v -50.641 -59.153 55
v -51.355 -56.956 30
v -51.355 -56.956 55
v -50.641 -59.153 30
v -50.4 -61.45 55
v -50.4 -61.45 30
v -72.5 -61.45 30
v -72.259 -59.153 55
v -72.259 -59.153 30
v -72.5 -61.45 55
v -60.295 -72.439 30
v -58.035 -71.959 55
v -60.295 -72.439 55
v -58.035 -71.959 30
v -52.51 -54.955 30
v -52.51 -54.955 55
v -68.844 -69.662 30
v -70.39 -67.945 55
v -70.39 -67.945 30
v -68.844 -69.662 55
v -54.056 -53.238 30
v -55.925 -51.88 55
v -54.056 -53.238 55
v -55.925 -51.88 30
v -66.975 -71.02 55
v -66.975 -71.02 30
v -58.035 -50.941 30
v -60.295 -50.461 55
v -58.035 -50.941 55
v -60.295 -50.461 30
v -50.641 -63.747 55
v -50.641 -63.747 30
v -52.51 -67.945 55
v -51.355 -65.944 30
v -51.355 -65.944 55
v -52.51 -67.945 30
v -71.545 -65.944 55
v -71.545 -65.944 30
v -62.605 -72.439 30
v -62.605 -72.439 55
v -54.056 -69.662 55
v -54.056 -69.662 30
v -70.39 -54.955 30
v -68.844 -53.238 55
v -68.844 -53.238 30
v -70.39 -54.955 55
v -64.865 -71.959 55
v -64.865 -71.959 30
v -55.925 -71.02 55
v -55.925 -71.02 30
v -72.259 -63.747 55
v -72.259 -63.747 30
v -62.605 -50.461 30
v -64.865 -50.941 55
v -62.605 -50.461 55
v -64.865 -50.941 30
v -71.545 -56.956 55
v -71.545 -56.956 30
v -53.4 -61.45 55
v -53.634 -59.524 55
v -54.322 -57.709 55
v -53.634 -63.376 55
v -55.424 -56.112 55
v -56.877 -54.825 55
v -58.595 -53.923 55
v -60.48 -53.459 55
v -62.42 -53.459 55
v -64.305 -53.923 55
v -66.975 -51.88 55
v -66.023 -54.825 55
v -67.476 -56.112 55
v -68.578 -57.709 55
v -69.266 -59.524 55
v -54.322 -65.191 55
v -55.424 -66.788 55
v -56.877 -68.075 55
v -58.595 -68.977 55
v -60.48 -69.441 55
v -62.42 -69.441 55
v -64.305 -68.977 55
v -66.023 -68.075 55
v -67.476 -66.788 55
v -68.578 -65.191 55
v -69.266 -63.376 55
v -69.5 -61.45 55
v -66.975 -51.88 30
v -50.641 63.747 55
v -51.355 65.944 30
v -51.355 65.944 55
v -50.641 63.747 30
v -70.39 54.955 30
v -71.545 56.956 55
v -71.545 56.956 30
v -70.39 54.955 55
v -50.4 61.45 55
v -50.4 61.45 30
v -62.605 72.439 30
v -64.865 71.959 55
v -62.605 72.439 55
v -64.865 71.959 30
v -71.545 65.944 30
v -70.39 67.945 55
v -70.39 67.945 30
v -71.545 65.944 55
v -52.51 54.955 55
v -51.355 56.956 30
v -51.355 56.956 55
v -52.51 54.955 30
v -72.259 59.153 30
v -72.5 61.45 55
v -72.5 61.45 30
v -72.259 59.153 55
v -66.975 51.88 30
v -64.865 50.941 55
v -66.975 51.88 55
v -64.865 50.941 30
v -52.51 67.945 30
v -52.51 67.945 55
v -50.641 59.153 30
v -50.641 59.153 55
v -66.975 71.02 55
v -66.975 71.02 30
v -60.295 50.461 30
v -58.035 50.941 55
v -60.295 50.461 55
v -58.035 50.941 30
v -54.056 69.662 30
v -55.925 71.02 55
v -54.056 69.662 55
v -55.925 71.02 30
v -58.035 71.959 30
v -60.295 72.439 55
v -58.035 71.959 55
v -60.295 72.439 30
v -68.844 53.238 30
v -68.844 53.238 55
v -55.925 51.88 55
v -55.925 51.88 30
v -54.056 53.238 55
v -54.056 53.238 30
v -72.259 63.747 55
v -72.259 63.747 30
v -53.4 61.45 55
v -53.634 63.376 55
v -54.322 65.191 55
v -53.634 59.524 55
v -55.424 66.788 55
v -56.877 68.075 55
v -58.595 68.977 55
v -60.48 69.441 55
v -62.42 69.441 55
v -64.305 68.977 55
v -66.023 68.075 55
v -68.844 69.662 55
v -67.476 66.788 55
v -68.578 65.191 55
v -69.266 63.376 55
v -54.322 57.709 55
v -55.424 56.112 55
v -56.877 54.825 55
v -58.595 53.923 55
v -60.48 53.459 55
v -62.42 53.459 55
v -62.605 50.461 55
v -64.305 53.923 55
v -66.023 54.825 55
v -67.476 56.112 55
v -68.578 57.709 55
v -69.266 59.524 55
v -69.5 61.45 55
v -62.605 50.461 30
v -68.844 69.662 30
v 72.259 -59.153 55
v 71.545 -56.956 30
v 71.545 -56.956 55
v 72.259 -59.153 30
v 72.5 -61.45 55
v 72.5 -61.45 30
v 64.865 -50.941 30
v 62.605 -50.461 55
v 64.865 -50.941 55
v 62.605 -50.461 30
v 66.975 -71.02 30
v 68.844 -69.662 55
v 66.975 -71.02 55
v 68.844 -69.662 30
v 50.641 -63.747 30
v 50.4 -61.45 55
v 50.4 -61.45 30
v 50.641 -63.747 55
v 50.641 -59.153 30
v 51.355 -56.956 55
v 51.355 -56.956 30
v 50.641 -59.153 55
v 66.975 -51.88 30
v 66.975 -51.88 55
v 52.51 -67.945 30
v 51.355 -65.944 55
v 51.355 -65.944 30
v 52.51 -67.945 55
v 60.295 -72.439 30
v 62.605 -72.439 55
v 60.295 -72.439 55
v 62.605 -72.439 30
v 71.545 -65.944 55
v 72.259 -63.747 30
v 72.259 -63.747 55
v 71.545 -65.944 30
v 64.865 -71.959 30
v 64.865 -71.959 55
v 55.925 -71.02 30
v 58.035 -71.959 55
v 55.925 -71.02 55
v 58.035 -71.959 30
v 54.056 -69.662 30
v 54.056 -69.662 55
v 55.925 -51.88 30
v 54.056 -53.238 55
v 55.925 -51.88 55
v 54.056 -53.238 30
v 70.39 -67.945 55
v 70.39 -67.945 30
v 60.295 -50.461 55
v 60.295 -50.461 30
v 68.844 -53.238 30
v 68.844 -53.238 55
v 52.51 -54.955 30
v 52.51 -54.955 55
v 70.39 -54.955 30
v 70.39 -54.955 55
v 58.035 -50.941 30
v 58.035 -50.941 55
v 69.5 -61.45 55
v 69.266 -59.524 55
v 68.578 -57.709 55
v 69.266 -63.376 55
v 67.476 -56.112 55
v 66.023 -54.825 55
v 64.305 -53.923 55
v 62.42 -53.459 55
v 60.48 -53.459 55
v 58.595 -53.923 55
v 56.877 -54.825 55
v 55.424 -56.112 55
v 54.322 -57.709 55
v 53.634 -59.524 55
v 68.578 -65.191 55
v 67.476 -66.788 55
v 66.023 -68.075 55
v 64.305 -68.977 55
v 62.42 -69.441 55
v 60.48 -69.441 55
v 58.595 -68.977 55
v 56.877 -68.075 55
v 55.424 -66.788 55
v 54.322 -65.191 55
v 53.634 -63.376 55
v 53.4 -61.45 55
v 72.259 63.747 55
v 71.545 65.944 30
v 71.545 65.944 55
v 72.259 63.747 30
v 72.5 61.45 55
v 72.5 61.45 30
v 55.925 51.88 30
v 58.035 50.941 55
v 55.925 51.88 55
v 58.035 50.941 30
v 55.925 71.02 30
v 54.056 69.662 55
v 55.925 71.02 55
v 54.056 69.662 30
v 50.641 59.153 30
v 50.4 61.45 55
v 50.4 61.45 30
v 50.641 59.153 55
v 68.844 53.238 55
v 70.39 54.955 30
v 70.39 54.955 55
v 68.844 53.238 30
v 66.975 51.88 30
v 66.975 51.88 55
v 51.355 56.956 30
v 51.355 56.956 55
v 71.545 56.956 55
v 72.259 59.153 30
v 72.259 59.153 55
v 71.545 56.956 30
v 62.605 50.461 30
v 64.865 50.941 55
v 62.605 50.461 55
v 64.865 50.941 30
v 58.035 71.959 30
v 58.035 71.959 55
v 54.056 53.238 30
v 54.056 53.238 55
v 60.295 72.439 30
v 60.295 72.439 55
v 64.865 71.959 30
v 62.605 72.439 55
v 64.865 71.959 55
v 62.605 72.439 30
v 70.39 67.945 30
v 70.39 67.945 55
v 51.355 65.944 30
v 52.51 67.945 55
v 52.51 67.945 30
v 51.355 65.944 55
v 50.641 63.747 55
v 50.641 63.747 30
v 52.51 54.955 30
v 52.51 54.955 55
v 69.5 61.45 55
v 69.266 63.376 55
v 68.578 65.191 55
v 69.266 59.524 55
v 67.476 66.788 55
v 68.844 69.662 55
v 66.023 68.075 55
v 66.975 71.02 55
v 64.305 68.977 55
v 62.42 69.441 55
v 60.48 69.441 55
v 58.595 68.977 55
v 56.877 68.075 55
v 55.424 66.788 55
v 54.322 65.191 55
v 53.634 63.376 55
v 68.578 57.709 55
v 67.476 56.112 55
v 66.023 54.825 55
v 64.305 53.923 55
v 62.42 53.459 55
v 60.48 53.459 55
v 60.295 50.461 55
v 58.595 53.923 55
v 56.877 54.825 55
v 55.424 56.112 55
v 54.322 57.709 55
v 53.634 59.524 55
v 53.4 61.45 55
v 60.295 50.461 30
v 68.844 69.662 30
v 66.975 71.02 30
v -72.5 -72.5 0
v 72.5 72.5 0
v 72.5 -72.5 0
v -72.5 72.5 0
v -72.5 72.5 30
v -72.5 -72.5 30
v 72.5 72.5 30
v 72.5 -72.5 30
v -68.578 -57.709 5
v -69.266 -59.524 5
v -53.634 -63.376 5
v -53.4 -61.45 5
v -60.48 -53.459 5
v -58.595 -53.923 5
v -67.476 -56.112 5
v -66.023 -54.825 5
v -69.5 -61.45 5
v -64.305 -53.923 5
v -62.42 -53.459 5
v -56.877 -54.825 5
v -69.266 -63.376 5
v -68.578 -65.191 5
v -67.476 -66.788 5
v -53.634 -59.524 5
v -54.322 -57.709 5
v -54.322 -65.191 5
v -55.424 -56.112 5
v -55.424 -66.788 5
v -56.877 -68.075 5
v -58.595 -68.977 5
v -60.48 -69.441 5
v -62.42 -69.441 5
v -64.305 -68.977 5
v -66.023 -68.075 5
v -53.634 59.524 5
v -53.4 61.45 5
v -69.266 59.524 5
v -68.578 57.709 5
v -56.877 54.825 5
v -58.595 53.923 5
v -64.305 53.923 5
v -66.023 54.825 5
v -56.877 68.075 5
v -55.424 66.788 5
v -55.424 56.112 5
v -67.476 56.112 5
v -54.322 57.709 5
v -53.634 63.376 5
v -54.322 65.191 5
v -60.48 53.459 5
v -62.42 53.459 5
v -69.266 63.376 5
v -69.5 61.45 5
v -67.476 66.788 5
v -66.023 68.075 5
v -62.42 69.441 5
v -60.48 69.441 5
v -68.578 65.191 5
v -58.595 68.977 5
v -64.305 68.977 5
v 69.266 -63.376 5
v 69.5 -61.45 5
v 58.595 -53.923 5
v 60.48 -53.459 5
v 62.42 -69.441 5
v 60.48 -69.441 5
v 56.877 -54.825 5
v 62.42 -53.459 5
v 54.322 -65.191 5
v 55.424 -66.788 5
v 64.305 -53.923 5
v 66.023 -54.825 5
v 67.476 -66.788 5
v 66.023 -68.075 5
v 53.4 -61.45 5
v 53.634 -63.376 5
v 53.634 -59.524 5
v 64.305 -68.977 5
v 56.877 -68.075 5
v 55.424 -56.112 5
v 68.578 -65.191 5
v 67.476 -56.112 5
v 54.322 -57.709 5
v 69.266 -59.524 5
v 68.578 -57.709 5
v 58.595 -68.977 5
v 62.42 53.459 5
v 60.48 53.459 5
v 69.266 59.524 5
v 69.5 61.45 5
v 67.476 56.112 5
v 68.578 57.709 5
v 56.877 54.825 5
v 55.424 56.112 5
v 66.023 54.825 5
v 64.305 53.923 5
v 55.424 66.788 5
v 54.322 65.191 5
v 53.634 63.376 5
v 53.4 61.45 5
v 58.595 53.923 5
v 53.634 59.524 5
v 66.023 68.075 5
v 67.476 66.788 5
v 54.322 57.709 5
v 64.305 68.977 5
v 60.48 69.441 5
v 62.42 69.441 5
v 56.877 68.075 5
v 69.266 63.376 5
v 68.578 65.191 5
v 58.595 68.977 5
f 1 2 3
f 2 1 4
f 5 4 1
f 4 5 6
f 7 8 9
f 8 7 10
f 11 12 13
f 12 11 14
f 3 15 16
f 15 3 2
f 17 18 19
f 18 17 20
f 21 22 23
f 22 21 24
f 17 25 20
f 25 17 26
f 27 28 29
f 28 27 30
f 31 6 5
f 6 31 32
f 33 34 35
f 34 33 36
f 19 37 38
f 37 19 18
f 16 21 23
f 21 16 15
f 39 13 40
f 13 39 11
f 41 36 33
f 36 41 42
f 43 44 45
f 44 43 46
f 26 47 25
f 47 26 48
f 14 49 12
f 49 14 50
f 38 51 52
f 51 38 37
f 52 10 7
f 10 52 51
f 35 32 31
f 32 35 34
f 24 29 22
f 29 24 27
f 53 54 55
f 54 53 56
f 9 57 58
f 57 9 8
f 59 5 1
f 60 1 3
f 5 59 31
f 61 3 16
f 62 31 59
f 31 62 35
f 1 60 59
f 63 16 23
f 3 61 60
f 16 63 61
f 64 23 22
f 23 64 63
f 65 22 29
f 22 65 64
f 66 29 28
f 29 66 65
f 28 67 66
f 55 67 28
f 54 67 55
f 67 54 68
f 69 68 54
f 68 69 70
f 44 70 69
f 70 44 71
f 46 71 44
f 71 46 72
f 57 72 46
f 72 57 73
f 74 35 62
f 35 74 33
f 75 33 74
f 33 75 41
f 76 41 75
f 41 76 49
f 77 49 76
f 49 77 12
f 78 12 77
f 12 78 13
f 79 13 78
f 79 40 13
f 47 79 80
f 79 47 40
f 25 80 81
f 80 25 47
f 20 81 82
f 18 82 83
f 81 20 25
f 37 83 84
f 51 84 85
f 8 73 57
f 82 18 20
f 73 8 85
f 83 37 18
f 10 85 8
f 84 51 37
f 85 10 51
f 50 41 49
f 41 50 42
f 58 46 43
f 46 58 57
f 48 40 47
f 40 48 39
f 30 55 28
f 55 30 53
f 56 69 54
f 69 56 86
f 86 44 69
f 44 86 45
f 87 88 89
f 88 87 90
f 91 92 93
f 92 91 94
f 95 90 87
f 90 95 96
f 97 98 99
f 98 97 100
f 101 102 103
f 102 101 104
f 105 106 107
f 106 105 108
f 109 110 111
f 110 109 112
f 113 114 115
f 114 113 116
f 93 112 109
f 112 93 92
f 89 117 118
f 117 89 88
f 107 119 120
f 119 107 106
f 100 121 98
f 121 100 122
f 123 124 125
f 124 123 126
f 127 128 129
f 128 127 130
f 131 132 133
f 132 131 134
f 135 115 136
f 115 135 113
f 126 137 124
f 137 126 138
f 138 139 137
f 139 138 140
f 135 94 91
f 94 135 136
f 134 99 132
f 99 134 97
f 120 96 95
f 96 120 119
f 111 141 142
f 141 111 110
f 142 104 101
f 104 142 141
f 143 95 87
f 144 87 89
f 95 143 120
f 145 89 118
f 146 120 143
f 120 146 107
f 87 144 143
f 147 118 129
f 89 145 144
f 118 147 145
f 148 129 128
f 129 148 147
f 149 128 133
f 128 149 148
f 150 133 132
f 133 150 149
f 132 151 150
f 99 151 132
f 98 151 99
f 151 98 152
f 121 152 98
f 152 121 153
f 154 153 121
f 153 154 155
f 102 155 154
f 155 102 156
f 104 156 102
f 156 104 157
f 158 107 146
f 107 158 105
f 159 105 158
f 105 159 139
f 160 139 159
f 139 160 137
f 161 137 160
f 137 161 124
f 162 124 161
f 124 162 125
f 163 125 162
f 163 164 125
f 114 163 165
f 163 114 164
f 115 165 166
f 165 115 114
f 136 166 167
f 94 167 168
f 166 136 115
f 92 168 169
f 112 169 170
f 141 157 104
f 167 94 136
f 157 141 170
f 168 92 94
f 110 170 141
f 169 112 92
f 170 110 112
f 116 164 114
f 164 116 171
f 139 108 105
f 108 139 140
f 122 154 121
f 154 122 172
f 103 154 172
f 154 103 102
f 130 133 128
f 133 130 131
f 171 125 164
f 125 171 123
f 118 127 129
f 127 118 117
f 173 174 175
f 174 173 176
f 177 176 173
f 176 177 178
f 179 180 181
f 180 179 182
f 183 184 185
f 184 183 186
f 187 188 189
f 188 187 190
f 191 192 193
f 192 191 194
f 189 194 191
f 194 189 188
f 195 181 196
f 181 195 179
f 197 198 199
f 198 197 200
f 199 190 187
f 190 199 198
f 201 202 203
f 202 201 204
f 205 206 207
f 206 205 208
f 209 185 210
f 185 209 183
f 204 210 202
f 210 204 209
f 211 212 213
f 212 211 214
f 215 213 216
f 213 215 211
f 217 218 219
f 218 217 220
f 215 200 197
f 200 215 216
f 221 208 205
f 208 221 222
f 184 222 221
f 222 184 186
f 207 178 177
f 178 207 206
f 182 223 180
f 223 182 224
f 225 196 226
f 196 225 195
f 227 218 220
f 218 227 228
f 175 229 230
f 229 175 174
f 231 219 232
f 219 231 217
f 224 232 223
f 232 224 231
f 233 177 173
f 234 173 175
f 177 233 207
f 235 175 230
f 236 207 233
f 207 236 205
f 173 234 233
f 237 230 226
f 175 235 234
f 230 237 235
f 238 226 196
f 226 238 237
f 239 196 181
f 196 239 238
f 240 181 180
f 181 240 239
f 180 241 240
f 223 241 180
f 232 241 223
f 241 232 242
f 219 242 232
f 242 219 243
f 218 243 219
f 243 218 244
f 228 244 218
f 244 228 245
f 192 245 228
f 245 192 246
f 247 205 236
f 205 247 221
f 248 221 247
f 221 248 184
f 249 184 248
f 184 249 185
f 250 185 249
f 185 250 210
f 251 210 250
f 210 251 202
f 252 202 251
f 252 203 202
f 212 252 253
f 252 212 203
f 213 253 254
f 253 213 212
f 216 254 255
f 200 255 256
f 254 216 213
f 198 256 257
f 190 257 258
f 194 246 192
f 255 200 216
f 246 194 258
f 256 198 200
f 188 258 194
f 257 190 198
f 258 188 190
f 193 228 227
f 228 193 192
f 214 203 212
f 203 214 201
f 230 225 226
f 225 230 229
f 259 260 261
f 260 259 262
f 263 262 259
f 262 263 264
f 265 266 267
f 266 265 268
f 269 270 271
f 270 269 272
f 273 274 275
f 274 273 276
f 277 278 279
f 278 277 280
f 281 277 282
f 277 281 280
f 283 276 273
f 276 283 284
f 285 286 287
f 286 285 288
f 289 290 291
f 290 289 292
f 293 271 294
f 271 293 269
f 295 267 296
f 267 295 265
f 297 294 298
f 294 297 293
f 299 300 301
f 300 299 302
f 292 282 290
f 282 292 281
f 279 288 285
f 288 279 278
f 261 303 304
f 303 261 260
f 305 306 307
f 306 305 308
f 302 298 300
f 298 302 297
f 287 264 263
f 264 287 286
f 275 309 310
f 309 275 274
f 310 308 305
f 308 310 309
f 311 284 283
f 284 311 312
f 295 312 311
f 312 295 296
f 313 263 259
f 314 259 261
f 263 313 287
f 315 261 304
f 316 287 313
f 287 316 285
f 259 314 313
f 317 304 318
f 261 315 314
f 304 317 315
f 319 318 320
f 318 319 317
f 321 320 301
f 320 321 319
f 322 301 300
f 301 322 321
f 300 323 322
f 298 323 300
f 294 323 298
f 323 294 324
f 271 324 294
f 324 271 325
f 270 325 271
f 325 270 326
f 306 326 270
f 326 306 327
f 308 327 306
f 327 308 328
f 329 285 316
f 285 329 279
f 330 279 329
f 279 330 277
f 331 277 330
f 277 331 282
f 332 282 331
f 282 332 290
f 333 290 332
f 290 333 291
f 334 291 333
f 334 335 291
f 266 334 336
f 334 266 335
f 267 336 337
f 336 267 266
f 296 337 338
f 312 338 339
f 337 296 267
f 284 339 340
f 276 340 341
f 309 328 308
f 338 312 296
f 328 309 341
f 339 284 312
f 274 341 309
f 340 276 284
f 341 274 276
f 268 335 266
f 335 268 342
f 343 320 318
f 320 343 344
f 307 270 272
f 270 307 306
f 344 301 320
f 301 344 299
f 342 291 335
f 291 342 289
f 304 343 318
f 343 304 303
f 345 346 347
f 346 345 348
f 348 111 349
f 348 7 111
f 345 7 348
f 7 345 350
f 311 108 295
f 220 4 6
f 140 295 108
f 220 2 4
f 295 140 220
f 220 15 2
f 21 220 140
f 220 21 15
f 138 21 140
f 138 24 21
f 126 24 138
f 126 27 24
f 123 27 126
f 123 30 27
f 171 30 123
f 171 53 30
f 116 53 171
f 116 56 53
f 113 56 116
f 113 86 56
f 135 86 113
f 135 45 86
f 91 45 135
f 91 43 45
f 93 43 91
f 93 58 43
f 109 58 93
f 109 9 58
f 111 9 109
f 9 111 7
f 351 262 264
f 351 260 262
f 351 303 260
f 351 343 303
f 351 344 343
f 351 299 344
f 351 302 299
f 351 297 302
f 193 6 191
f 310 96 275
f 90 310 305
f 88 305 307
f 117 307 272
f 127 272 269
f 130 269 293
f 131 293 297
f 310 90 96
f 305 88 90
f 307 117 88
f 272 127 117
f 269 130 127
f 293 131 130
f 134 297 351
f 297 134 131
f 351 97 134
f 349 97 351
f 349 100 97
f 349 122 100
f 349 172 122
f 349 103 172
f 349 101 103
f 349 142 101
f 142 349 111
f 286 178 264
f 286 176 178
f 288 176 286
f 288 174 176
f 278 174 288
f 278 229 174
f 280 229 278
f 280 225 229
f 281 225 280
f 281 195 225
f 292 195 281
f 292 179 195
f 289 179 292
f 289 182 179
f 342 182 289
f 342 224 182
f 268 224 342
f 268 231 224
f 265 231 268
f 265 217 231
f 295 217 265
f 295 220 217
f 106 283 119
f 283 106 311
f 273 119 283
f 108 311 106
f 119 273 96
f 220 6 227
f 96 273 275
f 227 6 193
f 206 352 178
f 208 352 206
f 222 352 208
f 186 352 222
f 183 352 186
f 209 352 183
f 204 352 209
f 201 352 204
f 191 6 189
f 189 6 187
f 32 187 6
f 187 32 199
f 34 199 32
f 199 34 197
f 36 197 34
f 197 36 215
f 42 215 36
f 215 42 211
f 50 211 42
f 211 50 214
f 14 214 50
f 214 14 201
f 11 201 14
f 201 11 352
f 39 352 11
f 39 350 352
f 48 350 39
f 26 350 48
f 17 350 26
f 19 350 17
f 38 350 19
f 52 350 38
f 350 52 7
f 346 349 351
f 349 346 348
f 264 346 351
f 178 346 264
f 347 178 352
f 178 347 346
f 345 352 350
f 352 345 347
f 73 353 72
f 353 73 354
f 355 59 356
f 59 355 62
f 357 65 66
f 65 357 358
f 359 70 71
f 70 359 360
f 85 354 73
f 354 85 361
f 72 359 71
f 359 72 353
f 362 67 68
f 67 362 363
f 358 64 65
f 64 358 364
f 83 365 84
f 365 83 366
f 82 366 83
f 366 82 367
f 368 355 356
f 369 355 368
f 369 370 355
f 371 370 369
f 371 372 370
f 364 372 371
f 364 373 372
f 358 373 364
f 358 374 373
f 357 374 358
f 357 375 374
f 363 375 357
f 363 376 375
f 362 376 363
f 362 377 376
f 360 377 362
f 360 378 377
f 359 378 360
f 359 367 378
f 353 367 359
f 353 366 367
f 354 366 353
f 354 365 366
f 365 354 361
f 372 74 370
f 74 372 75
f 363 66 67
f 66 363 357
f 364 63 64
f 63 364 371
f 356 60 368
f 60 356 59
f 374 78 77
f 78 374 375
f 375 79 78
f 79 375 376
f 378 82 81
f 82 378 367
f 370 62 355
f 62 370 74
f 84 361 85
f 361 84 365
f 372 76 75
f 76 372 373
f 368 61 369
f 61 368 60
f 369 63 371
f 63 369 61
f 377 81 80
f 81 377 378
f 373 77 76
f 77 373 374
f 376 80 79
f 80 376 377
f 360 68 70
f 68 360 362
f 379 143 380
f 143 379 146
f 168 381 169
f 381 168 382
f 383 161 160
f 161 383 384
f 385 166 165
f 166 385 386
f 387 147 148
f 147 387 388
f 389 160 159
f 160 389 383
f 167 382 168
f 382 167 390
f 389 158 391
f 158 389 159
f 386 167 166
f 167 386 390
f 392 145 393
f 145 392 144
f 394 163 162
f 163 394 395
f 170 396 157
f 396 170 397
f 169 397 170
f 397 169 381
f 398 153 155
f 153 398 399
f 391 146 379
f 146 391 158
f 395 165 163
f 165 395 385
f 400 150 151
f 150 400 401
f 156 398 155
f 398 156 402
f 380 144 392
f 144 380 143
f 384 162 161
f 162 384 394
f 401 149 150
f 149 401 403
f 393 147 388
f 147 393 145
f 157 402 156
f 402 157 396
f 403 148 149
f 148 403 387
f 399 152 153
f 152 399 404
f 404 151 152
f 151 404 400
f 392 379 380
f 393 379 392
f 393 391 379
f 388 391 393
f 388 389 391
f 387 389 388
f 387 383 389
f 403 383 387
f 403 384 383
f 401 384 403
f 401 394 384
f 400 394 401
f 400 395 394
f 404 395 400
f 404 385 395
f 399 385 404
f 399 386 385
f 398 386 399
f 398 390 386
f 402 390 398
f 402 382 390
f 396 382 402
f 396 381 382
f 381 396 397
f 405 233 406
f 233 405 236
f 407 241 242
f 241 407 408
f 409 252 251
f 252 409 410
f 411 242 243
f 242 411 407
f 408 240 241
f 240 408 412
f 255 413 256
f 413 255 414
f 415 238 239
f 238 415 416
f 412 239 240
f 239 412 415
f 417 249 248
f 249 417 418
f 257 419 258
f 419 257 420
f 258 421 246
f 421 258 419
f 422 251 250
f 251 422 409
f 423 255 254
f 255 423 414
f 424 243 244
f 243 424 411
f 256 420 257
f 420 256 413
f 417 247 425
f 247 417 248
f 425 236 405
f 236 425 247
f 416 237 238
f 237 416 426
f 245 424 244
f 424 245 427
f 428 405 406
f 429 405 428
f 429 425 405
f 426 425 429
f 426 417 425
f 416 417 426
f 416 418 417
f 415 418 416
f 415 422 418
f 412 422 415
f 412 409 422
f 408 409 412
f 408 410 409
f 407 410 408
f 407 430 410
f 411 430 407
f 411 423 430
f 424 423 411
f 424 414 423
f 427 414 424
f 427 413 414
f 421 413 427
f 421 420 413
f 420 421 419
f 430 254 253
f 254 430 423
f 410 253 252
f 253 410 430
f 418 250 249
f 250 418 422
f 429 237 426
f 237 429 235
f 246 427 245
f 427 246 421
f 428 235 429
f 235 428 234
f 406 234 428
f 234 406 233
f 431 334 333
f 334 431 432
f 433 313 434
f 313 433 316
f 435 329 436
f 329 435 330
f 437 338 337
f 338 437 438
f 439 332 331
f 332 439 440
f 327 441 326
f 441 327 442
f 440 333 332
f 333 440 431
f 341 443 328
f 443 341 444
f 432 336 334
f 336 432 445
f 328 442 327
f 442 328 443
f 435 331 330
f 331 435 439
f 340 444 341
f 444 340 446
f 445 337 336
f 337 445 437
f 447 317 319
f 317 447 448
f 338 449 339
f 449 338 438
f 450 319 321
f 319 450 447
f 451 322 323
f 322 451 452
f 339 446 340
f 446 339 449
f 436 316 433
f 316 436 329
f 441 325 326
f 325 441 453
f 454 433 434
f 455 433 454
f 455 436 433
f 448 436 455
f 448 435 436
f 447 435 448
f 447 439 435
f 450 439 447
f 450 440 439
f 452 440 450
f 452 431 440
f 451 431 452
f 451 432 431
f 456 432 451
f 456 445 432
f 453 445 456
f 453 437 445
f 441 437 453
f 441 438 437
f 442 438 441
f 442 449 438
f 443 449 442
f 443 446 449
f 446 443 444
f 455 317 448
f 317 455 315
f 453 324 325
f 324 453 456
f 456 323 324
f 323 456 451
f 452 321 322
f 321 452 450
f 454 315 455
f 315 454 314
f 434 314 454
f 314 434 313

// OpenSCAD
use <MCAD/regular_shapes.scad>

dell_stick_hole_length=50;
dell_stick_hole_diameter=16.10;
dell_stick_thickness=6;
base_dimensions=145;

module hole() {
     linear_extrude(height=dell_stick_hole_length+4) {
          circle(d=dell_stick_hole_diameter);
     }
}

module dell_holder_exterior() {
     linear_extrude(height=dell_stick_hole_length) {
          circle(d=dell_stick_hole_diameter+dell_stick_thickness);
     }
}


module dell_holder() {
     difference() {
          dell_holder_exterior();
          hole();
     }
}


module platform_base(){
     linear_extrude(height=30)
     square(base_dimensions, center=true);
}



dell_holder_offset=(base_dimensions - dell_stick_thickness - dell_stick_hole_diameter) /2;
module platform_exterior() {


     for (x =[-1:2:1]){
          for (y =[-1:2:1]){
               translate([dell_holder_offset *x,dell_holder_offset*y,5]) {
                    dell_holder_exterior();
               }
          }
     }

     platform_base();
}

module platform_holes(){
     for (x =[-1:2:1]){
          for (y =[-1:2:1]){
               translate([dell_holder_offset * x,dell_holder_offset * y, 5]) {
                    hole();
               }
          }
     }
}

difference (){
     platform_exterior();
     platform_holes();
}
